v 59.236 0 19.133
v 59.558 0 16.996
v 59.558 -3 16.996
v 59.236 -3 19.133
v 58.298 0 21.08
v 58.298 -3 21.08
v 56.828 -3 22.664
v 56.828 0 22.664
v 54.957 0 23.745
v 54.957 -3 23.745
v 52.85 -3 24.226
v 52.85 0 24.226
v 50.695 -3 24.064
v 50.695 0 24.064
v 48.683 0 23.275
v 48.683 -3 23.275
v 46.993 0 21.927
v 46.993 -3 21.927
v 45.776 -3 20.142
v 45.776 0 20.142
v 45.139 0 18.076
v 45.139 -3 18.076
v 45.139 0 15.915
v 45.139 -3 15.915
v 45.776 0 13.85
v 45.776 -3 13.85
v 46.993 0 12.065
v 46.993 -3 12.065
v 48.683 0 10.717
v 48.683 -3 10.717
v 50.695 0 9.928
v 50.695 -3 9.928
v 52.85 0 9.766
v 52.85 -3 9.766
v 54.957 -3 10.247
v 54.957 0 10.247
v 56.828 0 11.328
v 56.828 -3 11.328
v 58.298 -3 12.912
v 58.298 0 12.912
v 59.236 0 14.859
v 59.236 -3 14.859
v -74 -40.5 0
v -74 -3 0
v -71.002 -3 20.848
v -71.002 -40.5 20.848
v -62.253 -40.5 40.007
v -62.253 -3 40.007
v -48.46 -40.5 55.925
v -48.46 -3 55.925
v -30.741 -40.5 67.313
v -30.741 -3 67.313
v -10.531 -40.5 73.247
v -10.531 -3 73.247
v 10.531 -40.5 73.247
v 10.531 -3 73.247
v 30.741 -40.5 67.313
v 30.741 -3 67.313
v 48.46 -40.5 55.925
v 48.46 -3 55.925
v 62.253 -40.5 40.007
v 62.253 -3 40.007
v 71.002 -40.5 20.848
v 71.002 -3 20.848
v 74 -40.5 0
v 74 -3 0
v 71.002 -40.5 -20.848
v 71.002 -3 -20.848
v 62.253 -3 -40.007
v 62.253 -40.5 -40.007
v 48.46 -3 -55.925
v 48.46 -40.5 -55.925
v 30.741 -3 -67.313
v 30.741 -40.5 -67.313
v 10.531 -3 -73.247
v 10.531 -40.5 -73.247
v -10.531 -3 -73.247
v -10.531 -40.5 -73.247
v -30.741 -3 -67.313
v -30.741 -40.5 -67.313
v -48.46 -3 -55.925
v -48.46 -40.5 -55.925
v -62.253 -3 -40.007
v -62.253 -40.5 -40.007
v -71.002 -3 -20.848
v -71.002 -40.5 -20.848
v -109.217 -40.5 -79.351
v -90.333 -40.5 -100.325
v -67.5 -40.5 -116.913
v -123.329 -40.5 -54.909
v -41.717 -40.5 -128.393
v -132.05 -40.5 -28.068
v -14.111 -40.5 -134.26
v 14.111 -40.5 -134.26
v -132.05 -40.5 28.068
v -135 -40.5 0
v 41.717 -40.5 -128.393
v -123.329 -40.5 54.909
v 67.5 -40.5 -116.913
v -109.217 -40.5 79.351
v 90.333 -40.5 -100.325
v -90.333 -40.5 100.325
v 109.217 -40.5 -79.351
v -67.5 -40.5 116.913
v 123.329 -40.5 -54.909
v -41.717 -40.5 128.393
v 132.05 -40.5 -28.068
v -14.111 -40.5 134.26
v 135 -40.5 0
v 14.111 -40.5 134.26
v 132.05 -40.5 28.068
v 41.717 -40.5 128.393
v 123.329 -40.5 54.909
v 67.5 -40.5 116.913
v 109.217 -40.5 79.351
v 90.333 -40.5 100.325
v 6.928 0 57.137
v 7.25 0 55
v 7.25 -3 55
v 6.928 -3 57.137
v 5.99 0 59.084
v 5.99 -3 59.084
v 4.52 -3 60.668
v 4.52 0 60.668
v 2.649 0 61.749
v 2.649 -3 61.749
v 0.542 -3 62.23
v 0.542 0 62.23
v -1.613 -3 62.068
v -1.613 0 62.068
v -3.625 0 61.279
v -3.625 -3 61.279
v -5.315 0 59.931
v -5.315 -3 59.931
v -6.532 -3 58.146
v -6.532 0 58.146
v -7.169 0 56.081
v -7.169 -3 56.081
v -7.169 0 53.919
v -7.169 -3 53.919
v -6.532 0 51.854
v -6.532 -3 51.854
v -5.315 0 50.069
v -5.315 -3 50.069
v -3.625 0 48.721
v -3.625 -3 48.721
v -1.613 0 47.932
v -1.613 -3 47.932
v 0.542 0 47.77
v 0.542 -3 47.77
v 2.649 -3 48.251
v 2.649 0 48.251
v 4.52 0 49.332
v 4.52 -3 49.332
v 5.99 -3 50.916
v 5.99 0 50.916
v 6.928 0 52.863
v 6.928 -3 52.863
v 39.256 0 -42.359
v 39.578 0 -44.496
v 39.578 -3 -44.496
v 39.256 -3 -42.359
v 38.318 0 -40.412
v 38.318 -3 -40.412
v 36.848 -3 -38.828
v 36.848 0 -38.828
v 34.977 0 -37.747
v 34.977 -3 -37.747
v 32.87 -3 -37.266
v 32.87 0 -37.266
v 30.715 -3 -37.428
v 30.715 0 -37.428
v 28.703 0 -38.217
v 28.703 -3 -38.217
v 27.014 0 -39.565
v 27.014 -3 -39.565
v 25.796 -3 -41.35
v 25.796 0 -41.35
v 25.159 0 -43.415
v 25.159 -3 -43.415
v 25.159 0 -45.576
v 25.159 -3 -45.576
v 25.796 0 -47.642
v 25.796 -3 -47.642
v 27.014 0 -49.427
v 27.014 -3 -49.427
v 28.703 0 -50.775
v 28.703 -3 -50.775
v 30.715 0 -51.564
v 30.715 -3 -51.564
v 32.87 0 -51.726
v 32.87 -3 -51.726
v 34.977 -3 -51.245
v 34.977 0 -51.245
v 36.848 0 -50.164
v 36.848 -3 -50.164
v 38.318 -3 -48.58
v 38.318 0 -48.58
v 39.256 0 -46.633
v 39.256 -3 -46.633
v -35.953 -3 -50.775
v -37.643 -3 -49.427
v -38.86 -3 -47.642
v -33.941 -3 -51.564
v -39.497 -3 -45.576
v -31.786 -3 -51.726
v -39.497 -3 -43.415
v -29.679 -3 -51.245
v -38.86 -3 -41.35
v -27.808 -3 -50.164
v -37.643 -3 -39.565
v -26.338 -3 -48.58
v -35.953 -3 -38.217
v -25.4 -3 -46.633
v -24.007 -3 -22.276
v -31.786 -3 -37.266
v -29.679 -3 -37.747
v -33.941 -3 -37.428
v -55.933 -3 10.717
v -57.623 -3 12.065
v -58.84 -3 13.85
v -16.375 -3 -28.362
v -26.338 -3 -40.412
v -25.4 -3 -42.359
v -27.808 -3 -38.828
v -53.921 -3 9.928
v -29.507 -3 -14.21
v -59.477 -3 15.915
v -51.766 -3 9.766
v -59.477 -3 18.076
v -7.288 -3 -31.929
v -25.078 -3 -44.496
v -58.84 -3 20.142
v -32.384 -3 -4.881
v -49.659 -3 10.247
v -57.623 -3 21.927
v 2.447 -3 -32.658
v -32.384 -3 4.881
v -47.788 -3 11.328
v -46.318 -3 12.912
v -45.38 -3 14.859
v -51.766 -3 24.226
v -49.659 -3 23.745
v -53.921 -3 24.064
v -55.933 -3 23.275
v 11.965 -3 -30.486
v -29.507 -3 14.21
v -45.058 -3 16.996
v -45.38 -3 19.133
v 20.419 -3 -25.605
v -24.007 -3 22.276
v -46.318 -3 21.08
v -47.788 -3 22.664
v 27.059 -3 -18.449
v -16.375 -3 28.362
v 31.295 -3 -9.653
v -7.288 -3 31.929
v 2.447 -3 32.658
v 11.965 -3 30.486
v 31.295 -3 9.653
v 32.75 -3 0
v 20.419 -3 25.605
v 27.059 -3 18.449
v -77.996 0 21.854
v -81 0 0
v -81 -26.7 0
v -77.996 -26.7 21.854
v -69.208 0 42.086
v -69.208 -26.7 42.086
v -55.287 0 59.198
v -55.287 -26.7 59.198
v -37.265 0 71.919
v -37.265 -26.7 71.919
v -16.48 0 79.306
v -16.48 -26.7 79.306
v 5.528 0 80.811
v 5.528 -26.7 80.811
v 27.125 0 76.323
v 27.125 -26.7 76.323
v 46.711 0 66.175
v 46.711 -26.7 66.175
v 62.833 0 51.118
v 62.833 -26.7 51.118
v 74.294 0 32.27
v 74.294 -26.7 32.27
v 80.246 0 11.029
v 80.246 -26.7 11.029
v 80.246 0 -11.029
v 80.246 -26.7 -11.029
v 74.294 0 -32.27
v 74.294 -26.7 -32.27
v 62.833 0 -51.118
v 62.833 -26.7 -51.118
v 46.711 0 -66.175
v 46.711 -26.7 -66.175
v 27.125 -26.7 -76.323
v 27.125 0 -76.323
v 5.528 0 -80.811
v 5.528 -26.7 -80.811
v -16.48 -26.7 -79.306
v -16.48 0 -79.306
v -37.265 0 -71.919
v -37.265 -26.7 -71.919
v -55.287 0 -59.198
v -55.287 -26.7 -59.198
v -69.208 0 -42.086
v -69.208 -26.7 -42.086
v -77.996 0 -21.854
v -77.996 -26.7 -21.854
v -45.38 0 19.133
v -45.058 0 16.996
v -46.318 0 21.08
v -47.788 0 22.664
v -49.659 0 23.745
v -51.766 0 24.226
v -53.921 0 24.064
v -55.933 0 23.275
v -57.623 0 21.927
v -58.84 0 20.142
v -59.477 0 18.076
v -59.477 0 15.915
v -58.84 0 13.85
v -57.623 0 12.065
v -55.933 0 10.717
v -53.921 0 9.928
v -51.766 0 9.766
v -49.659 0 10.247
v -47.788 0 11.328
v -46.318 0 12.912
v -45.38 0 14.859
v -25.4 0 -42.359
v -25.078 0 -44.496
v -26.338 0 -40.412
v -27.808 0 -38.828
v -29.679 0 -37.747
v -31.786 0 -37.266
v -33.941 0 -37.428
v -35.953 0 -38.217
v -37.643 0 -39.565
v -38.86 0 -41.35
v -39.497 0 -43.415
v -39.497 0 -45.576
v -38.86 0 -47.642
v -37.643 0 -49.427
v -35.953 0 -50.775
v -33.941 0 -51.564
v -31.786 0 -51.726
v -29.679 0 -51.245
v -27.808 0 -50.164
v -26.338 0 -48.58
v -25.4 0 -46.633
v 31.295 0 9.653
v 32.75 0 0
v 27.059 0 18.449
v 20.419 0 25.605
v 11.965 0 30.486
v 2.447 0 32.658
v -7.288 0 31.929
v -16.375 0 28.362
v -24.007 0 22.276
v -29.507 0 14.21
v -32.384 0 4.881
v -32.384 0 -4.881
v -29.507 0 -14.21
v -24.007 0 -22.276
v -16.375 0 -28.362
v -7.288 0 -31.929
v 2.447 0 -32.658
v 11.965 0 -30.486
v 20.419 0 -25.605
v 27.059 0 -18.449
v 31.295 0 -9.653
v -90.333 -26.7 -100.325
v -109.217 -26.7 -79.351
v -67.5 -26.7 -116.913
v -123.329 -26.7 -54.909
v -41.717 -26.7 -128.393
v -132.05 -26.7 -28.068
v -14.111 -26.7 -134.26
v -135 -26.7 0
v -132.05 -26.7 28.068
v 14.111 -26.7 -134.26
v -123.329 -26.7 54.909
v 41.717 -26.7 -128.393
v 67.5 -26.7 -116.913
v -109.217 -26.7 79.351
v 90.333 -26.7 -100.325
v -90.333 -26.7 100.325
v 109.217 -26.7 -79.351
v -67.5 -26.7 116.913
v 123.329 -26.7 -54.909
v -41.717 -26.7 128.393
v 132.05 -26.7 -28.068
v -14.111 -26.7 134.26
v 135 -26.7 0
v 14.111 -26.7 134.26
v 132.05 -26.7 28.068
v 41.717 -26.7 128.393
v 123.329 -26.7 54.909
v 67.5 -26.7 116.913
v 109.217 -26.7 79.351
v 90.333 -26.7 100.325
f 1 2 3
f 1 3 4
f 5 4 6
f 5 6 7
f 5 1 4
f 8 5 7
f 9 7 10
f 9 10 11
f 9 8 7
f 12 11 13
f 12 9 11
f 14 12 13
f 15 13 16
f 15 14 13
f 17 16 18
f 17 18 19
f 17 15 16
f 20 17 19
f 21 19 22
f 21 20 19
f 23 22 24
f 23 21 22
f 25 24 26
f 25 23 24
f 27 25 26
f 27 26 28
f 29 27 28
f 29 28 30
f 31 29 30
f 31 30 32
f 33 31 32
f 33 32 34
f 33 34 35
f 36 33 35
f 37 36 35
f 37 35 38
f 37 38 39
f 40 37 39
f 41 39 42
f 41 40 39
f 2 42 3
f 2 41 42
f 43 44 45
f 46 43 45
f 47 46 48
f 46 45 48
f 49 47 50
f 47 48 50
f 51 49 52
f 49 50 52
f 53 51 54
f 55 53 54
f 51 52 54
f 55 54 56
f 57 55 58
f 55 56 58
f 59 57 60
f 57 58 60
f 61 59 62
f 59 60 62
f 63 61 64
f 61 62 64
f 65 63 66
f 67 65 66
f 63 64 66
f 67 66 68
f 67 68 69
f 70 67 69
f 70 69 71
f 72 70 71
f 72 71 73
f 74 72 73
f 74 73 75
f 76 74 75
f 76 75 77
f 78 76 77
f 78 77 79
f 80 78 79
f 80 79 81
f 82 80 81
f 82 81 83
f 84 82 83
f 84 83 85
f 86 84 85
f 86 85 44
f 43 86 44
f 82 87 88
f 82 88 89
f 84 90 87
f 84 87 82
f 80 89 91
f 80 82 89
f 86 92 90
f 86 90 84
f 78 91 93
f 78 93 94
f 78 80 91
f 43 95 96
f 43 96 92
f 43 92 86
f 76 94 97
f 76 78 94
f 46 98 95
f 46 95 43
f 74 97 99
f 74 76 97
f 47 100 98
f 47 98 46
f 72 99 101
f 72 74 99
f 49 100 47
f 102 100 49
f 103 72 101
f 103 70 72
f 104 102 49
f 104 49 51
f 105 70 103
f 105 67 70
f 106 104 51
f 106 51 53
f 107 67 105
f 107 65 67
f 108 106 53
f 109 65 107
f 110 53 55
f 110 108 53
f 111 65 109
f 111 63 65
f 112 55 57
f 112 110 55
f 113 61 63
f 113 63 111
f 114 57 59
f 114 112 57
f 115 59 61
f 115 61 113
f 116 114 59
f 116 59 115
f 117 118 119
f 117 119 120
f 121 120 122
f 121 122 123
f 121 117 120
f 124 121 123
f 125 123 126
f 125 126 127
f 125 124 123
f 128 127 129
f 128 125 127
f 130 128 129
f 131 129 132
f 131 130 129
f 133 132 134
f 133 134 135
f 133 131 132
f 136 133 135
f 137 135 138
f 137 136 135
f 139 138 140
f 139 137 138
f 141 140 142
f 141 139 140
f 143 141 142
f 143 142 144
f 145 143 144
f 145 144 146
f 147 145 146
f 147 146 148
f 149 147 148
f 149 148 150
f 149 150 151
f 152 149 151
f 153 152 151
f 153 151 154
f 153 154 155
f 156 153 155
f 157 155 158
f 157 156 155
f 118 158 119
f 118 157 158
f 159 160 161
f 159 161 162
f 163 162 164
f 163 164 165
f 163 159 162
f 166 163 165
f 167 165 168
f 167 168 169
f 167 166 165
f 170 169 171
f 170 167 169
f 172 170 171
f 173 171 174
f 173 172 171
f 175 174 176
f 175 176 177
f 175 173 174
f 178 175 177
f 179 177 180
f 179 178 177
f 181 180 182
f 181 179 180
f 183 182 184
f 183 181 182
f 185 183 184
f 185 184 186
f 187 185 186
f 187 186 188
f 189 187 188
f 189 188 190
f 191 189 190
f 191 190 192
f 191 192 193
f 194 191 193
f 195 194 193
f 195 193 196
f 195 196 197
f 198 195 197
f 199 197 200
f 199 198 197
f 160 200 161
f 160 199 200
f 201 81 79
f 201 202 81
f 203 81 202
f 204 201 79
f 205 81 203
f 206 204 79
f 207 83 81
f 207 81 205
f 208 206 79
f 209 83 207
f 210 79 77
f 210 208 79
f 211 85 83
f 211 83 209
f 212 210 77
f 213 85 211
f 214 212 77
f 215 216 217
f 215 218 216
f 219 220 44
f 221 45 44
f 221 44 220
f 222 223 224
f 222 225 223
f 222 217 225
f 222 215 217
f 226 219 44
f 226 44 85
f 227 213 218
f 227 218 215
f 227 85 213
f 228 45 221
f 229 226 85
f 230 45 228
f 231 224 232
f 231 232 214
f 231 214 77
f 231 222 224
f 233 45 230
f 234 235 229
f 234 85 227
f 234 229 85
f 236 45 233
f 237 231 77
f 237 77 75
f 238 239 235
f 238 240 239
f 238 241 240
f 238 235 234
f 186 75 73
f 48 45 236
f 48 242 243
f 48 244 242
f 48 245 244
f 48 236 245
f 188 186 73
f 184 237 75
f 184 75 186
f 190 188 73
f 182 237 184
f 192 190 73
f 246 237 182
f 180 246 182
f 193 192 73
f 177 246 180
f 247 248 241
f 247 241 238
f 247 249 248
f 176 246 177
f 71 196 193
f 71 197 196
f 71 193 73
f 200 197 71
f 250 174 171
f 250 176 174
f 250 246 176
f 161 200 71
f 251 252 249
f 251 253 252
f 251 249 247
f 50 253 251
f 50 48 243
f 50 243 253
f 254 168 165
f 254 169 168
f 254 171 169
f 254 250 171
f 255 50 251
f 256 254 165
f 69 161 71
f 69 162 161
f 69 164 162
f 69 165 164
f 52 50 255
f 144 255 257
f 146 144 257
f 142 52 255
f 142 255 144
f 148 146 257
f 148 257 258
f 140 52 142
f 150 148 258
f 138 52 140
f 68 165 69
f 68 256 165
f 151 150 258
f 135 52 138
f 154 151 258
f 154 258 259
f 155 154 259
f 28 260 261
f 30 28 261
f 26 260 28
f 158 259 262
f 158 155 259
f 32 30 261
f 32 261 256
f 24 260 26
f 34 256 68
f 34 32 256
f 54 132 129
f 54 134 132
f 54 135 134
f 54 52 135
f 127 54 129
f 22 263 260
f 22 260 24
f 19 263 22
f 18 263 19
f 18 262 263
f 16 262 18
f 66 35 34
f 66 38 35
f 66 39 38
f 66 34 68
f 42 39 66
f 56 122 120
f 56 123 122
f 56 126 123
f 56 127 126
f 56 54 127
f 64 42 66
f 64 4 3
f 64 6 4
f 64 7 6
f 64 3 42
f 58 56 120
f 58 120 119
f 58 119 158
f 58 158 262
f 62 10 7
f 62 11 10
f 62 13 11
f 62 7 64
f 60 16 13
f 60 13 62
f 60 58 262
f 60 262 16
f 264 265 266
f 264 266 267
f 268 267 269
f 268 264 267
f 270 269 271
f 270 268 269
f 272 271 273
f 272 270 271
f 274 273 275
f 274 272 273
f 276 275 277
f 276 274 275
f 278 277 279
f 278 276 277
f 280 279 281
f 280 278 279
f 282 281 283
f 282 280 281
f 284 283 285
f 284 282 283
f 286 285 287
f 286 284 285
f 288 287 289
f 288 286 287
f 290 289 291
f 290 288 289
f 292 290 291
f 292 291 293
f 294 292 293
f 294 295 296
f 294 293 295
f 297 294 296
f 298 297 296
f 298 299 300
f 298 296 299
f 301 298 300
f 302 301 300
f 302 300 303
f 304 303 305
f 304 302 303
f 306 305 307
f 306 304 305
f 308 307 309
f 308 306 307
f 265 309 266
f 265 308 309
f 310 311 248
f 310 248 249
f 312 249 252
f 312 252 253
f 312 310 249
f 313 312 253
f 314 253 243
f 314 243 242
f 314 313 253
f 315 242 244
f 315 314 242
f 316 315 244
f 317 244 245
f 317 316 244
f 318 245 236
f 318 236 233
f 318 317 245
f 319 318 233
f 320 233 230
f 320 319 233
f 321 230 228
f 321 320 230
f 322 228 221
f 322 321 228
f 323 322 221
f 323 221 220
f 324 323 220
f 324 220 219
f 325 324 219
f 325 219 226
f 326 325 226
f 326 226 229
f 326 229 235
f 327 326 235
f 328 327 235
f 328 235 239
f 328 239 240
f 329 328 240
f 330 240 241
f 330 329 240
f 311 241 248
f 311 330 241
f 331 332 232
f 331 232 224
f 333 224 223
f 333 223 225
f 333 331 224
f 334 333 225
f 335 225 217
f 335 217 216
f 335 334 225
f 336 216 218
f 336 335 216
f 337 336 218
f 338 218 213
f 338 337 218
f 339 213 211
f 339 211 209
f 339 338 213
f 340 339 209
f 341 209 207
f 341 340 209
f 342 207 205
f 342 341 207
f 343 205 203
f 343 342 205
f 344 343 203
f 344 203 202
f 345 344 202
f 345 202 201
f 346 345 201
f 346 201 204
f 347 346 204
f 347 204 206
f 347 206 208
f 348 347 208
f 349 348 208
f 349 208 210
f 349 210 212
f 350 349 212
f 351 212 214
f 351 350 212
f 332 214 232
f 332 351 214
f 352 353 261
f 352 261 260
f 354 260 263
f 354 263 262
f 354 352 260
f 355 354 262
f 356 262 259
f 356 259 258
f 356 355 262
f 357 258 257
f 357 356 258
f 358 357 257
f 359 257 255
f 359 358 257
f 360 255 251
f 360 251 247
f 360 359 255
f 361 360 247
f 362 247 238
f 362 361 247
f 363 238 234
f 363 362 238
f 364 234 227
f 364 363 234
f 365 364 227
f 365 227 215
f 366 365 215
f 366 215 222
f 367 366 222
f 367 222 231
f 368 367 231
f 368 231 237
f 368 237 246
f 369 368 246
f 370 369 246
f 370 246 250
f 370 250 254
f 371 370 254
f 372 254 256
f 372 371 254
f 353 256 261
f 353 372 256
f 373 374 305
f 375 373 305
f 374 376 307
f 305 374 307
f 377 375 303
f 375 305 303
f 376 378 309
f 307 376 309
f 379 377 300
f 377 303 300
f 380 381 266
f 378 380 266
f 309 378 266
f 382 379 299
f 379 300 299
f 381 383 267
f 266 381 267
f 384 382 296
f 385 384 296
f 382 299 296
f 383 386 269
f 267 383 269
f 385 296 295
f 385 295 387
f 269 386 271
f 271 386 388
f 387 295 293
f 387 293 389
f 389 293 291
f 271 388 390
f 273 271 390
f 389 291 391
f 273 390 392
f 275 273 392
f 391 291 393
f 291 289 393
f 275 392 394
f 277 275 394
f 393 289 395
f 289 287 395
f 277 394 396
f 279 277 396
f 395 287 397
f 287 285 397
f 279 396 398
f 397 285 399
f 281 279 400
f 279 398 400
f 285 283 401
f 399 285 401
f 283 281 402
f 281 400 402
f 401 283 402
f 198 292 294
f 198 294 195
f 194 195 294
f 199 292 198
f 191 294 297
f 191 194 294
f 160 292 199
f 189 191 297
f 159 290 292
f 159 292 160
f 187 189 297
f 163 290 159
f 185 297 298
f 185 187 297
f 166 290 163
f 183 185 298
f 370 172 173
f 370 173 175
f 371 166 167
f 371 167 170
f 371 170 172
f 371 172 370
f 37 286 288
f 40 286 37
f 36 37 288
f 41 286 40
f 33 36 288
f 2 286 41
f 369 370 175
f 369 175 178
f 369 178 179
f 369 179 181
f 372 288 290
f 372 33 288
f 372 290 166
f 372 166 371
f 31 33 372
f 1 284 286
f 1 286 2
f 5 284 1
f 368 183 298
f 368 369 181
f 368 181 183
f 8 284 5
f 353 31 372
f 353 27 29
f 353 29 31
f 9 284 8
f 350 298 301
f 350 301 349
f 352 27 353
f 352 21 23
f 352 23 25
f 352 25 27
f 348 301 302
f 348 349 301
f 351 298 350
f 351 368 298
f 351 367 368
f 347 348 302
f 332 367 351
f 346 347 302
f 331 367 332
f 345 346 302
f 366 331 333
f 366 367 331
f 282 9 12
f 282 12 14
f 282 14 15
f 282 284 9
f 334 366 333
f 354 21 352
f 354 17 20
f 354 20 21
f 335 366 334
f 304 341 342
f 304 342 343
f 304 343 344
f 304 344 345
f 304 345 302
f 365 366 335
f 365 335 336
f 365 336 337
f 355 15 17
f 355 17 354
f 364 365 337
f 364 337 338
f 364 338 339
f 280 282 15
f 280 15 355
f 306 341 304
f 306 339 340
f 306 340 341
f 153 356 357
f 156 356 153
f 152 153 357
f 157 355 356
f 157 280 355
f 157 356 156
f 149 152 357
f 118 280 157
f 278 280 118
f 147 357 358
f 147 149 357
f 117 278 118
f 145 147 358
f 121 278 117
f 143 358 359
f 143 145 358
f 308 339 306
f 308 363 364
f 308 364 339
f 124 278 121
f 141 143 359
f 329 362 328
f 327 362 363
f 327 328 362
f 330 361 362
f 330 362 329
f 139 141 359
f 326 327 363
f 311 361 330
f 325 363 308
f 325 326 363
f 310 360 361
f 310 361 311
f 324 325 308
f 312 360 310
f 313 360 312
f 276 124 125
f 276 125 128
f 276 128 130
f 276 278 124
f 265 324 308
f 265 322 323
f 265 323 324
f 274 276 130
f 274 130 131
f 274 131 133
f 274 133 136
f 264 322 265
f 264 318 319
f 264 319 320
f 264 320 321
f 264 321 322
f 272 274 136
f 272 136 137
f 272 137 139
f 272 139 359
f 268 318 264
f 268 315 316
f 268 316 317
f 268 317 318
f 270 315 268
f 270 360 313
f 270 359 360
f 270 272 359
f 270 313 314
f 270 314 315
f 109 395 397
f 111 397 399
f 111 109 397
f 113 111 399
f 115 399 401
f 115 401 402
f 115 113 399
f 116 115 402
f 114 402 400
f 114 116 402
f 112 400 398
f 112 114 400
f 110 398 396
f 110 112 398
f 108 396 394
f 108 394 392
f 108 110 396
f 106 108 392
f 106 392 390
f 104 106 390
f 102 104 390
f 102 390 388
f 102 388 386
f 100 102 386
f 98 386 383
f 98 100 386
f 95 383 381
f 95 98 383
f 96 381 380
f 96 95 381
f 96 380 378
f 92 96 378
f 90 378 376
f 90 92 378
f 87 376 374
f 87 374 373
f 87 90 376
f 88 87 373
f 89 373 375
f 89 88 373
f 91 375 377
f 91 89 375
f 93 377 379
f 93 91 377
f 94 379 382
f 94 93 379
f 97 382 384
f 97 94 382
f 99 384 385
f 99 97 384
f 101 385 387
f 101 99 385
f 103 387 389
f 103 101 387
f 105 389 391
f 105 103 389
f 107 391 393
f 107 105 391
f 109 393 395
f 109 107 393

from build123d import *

# Parameters (mm, degrees)
F0_R     = 74
F0_R_2   = 7.25
F0_R_3   = 32.75
F1_DEPTH = 3
F2_R     = 81
F2_R_2   = 74
F3_DEPTH = 40.5
F4_R     = 135
F4_R_2   = 81
F5_DEPTH = 13.8


with BuildPart() as f1:
    # F0 (on Front) → F1 (new body)
    with BuildSketch(Plane.XZ):
        Circle(F0_R)
        with Locations((-32.3281888761, -44.4959346906)):
            Circle(F0_R_2, mode=Mode.SUBTRACT)
        with Locations((32.3281888761, -44.4959346906)):
            Circle(F0_R_2, mode=Mode.SUBTRACT)
        with Locations((-52.3081083962, 16.9959346906)):
            Circle(F0_R_2, mode=Mode.SUBTRACT)
        Circle(F0_R_3, mode=Mode.SUBTRACT)
        with Locations((52.3081083962, 16.9959346906)):
            Circle(F0_R_2, mode=Mode.SUBTRACT)
        with Locations((0, 55)):
            Circle(F0_R_2, mode=Mode.SUBTRACT)
    extrude(amount=F1_DEPTH)

    # F2 (on face) → F3 (join)
    with BuildSketch(Plane(origin=(0, 0, 0), x_dir=(-1, 0, 0), z_dir=(0, 1, 0))):
        Circle(F2_R)
        Circle(F2_R_2, mode=Mode.SUBTRACT)
    extrude(amount=-F3_DEPTH)

    # F4 (on face) → F5 (join)
    with BuildSketch(Plane.XZ.offset(40.5)):
        Circle(F4_R)
        Circle(F4_R_2, mode=Mode.SUBTRACT)
    extrude(amount=-F5_DEPTH)


solid = f1.part
